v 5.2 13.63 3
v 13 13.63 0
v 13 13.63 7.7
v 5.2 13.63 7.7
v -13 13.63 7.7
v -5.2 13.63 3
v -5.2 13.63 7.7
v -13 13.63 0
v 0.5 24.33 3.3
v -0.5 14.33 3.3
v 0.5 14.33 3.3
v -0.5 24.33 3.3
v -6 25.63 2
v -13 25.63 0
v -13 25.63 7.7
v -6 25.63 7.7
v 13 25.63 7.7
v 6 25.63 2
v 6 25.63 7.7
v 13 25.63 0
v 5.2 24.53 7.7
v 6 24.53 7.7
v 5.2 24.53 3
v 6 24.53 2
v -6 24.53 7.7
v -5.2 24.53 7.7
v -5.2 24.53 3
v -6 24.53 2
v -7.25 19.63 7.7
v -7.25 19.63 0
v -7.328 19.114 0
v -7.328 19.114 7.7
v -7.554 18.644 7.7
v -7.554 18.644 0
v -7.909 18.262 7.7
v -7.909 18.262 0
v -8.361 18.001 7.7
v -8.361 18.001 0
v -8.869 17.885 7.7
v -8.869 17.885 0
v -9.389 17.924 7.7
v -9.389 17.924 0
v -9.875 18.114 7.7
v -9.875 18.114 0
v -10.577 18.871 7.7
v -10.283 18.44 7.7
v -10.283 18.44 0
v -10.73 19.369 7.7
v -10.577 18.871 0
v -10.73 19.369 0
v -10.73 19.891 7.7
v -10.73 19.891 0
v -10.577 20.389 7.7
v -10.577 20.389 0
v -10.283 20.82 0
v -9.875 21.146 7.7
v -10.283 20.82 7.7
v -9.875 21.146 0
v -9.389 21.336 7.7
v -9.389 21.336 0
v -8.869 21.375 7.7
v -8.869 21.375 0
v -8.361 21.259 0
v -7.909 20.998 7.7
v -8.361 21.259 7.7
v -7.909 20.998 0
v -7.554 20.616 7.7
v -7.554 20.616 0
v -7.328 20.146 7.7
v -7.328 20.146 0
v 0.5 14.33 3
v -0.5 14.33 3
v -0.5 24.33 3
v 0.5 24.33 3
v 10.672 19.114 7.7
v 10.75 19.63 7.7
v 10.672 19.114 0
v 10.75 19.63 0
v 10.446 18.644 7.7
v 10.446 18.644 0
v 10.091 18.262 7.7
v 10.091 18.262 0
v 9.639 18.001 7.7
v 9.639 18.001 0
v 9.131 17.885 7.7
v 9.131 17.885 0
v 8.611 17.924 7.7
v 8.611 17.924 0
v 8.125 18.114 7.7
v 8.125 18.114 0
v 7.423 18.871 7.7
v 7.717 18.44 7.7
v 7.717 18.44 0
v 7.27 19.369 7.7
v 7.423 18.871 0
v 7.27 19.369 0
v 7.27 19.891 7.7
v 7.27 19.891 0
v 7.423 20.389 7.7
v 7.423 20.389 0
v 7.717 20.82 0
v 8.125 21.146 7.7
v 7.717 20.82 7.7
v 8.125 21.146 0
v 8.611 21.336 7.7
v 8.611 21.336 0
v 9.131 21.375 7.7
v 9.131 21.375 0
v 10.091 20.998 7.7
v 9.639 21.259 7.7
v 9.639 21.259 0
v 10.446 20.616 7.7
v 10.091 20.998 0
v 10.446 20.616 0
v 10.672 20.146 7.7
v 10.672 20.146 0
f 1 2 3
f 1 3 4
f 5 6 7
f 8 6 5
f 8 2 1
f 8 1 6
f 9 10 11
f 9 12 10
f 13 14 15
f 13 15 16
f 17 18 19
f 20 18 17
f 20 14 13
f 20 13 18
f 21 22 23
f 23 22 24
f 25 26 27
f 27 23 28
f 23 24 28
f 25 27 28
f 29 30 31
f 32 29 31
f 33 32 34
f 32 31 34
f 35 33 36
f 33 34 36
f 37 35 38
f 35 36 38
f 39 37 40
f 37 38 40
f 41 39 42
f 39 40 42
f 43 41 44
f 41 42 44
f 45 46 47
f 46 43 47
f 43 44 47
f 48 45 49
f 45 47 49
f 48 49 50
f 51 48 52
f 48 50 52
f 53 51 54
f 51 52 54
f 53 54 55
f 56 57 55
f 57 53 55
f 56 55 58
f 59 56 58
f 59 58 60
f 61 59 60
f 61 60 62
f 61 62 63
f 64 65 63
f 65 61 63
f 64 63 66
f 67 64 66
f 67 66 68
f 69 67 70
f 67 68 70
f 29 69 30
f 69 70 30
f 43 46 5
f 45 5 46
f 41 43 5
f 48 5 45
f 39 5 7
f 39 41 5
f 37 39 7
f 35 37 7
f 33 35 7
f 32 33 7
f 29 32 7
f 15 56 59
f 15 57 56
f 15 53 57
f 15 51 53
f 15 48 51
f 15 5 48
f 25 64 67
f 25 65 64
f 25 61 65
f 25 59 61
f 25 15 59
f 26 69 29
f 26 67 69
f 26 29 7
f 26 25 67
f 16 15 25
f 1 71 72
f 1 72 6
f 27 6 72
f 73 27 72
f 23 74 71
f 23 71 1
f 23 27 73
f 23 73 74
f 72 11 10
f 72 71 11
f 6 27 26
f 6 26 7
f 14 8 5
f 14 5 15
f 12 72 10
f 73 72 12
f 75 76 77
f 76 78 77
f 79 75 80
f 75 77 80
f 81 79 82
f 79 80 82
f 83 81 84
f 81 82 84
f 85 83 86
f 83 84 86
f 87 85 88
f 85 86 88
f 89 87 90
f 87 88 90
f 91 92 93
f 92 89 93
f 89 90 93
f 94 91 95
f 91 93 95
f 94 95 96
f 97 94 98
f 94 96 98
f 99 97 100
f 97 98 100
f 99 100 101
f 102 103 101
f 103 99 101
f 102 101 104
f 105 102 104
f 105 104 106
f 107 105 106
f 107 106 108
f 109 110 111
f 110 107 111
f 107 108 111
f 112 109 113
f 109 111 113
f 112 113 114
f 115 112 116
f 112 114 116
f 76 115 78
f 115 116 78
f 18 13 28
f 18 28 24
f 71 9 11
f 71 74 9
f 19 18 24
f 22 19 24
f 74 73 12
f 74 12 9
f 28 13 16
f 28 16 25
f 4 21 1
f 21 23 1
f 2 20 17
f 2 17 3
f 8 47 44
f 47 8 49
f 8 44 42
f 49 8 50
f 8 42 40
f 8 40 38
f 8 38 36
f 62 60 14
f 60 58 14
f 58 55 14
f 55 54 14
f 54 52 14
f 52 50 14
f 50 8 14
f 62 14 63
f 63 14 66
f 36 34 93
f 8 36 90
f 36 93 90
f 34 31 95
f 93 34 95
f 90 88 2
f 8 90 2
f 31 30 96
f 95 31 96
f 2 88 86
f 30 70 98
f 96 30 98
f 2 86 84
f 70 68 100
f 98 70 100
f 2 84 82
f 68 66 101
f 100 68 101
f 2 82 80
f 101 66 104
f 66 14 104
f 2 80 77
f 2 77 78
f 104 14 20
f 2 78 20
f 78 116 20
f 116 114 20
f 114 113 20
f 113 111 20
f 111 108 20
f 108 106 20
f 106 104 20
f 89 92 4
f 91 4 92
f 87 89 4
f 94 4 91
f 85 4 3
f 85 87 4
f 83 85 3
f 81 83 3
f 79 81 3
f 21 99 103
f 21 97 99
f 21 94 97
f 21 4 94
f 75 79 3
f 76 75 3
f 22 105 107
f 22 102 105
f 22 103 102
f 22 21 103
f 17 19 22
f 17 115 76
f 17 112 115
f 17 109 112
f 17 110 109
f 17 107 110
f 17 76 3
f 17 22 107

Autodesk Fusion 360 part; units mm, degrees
sketch "Sketch1" plane through (0, 0, 0) normal (0, 0, 1) x (1, 0, 0) in component "PlugMountSmall"
  line L0 (-13, 25.63) -> (13, 25.63)
  line L1 (13, 25.63) -> (13, 13.63)
  line L2 (13, 13.63) -> (-13, 13.63)
  line L3 (-13, 13.63) -> (-13, 25.63)
  line L4 (0, 25.63) -> (0, 13.63) construction
  line L5 (13, 19.63) -> (-13, 19.63) construction
  line L6 (-0.5, 24.33) -> (0.5, 24.33)
  line L7 (0.5, 24.33) -> (0.5, 14.33)
  line L8 (0.5, 14.33) -> (-0.5, 14.33)
  line L9 (-0.5, 14.33) -> (-0.5, 24.33)
  line L10 (-6, 25.63) -> (-6, 24.53)
  line L11 (-6, 24.53) -> (-5.2, 24.53)
  line L12 (-5.2, 24.53) -> (-5.2, 13.63)
  circle A0 centre (-9, 19.63) radius 1.75
  circle A1 centre (9, 19.63) radius 1.75
  line L13 (5.2, 24.53) -> (5.2, 13.63)
  line L14 (6, 24.53) -> (5.2, 24.53)
  line L15 (6, 25.63) -> (6, 24.53)
  line L16 (-5.2, 24.53) -> (5.2, 24.53)
  dimension "d44_1" = 26
  dimension "d45_1" = 12
  dimension "d46_1" = 10
  dimension "d47_1" = 1.3
  dimension "d48_1" = 1
  dimension "d49_1" = 0.5
  dimension "d50_1" = 3.5
  dimension "d51_1" = 0.8
  dimension "d52_1" = 1.1
  dimension "d53_1" = 7
  dimension "d54_1" = 4
extrude "Extrude1" add sketch "Sketch1" along normal blind 3 contours L2 L12 L13 L16 | L6 L7 L8 L9 in component "PlugMountSmall"
extrude "Extrude2" add sketch "Sketch1" along normal blind 3.3 contours L6 L7 L8 L9 in component "PlugMountSmall"
extrude "Extrude3" add sketch "Sketch1" along normal blind 2 contours L0 L10 L11 L14 L15 L16 in component "PlugMountSmall"
extrude "Extrude4" add sketch "Sketch1" along normal blind 7.7 contours L0 L2 L3 L10 L11 L12 | L0 L1 L2 L13 L14 L15 in component "PlugMountSmall"
component "PlugMountSmall" placed x (1, 0, 0) y (0, 1, 0) z (0, 0, 1) at (0, 0, 0)
